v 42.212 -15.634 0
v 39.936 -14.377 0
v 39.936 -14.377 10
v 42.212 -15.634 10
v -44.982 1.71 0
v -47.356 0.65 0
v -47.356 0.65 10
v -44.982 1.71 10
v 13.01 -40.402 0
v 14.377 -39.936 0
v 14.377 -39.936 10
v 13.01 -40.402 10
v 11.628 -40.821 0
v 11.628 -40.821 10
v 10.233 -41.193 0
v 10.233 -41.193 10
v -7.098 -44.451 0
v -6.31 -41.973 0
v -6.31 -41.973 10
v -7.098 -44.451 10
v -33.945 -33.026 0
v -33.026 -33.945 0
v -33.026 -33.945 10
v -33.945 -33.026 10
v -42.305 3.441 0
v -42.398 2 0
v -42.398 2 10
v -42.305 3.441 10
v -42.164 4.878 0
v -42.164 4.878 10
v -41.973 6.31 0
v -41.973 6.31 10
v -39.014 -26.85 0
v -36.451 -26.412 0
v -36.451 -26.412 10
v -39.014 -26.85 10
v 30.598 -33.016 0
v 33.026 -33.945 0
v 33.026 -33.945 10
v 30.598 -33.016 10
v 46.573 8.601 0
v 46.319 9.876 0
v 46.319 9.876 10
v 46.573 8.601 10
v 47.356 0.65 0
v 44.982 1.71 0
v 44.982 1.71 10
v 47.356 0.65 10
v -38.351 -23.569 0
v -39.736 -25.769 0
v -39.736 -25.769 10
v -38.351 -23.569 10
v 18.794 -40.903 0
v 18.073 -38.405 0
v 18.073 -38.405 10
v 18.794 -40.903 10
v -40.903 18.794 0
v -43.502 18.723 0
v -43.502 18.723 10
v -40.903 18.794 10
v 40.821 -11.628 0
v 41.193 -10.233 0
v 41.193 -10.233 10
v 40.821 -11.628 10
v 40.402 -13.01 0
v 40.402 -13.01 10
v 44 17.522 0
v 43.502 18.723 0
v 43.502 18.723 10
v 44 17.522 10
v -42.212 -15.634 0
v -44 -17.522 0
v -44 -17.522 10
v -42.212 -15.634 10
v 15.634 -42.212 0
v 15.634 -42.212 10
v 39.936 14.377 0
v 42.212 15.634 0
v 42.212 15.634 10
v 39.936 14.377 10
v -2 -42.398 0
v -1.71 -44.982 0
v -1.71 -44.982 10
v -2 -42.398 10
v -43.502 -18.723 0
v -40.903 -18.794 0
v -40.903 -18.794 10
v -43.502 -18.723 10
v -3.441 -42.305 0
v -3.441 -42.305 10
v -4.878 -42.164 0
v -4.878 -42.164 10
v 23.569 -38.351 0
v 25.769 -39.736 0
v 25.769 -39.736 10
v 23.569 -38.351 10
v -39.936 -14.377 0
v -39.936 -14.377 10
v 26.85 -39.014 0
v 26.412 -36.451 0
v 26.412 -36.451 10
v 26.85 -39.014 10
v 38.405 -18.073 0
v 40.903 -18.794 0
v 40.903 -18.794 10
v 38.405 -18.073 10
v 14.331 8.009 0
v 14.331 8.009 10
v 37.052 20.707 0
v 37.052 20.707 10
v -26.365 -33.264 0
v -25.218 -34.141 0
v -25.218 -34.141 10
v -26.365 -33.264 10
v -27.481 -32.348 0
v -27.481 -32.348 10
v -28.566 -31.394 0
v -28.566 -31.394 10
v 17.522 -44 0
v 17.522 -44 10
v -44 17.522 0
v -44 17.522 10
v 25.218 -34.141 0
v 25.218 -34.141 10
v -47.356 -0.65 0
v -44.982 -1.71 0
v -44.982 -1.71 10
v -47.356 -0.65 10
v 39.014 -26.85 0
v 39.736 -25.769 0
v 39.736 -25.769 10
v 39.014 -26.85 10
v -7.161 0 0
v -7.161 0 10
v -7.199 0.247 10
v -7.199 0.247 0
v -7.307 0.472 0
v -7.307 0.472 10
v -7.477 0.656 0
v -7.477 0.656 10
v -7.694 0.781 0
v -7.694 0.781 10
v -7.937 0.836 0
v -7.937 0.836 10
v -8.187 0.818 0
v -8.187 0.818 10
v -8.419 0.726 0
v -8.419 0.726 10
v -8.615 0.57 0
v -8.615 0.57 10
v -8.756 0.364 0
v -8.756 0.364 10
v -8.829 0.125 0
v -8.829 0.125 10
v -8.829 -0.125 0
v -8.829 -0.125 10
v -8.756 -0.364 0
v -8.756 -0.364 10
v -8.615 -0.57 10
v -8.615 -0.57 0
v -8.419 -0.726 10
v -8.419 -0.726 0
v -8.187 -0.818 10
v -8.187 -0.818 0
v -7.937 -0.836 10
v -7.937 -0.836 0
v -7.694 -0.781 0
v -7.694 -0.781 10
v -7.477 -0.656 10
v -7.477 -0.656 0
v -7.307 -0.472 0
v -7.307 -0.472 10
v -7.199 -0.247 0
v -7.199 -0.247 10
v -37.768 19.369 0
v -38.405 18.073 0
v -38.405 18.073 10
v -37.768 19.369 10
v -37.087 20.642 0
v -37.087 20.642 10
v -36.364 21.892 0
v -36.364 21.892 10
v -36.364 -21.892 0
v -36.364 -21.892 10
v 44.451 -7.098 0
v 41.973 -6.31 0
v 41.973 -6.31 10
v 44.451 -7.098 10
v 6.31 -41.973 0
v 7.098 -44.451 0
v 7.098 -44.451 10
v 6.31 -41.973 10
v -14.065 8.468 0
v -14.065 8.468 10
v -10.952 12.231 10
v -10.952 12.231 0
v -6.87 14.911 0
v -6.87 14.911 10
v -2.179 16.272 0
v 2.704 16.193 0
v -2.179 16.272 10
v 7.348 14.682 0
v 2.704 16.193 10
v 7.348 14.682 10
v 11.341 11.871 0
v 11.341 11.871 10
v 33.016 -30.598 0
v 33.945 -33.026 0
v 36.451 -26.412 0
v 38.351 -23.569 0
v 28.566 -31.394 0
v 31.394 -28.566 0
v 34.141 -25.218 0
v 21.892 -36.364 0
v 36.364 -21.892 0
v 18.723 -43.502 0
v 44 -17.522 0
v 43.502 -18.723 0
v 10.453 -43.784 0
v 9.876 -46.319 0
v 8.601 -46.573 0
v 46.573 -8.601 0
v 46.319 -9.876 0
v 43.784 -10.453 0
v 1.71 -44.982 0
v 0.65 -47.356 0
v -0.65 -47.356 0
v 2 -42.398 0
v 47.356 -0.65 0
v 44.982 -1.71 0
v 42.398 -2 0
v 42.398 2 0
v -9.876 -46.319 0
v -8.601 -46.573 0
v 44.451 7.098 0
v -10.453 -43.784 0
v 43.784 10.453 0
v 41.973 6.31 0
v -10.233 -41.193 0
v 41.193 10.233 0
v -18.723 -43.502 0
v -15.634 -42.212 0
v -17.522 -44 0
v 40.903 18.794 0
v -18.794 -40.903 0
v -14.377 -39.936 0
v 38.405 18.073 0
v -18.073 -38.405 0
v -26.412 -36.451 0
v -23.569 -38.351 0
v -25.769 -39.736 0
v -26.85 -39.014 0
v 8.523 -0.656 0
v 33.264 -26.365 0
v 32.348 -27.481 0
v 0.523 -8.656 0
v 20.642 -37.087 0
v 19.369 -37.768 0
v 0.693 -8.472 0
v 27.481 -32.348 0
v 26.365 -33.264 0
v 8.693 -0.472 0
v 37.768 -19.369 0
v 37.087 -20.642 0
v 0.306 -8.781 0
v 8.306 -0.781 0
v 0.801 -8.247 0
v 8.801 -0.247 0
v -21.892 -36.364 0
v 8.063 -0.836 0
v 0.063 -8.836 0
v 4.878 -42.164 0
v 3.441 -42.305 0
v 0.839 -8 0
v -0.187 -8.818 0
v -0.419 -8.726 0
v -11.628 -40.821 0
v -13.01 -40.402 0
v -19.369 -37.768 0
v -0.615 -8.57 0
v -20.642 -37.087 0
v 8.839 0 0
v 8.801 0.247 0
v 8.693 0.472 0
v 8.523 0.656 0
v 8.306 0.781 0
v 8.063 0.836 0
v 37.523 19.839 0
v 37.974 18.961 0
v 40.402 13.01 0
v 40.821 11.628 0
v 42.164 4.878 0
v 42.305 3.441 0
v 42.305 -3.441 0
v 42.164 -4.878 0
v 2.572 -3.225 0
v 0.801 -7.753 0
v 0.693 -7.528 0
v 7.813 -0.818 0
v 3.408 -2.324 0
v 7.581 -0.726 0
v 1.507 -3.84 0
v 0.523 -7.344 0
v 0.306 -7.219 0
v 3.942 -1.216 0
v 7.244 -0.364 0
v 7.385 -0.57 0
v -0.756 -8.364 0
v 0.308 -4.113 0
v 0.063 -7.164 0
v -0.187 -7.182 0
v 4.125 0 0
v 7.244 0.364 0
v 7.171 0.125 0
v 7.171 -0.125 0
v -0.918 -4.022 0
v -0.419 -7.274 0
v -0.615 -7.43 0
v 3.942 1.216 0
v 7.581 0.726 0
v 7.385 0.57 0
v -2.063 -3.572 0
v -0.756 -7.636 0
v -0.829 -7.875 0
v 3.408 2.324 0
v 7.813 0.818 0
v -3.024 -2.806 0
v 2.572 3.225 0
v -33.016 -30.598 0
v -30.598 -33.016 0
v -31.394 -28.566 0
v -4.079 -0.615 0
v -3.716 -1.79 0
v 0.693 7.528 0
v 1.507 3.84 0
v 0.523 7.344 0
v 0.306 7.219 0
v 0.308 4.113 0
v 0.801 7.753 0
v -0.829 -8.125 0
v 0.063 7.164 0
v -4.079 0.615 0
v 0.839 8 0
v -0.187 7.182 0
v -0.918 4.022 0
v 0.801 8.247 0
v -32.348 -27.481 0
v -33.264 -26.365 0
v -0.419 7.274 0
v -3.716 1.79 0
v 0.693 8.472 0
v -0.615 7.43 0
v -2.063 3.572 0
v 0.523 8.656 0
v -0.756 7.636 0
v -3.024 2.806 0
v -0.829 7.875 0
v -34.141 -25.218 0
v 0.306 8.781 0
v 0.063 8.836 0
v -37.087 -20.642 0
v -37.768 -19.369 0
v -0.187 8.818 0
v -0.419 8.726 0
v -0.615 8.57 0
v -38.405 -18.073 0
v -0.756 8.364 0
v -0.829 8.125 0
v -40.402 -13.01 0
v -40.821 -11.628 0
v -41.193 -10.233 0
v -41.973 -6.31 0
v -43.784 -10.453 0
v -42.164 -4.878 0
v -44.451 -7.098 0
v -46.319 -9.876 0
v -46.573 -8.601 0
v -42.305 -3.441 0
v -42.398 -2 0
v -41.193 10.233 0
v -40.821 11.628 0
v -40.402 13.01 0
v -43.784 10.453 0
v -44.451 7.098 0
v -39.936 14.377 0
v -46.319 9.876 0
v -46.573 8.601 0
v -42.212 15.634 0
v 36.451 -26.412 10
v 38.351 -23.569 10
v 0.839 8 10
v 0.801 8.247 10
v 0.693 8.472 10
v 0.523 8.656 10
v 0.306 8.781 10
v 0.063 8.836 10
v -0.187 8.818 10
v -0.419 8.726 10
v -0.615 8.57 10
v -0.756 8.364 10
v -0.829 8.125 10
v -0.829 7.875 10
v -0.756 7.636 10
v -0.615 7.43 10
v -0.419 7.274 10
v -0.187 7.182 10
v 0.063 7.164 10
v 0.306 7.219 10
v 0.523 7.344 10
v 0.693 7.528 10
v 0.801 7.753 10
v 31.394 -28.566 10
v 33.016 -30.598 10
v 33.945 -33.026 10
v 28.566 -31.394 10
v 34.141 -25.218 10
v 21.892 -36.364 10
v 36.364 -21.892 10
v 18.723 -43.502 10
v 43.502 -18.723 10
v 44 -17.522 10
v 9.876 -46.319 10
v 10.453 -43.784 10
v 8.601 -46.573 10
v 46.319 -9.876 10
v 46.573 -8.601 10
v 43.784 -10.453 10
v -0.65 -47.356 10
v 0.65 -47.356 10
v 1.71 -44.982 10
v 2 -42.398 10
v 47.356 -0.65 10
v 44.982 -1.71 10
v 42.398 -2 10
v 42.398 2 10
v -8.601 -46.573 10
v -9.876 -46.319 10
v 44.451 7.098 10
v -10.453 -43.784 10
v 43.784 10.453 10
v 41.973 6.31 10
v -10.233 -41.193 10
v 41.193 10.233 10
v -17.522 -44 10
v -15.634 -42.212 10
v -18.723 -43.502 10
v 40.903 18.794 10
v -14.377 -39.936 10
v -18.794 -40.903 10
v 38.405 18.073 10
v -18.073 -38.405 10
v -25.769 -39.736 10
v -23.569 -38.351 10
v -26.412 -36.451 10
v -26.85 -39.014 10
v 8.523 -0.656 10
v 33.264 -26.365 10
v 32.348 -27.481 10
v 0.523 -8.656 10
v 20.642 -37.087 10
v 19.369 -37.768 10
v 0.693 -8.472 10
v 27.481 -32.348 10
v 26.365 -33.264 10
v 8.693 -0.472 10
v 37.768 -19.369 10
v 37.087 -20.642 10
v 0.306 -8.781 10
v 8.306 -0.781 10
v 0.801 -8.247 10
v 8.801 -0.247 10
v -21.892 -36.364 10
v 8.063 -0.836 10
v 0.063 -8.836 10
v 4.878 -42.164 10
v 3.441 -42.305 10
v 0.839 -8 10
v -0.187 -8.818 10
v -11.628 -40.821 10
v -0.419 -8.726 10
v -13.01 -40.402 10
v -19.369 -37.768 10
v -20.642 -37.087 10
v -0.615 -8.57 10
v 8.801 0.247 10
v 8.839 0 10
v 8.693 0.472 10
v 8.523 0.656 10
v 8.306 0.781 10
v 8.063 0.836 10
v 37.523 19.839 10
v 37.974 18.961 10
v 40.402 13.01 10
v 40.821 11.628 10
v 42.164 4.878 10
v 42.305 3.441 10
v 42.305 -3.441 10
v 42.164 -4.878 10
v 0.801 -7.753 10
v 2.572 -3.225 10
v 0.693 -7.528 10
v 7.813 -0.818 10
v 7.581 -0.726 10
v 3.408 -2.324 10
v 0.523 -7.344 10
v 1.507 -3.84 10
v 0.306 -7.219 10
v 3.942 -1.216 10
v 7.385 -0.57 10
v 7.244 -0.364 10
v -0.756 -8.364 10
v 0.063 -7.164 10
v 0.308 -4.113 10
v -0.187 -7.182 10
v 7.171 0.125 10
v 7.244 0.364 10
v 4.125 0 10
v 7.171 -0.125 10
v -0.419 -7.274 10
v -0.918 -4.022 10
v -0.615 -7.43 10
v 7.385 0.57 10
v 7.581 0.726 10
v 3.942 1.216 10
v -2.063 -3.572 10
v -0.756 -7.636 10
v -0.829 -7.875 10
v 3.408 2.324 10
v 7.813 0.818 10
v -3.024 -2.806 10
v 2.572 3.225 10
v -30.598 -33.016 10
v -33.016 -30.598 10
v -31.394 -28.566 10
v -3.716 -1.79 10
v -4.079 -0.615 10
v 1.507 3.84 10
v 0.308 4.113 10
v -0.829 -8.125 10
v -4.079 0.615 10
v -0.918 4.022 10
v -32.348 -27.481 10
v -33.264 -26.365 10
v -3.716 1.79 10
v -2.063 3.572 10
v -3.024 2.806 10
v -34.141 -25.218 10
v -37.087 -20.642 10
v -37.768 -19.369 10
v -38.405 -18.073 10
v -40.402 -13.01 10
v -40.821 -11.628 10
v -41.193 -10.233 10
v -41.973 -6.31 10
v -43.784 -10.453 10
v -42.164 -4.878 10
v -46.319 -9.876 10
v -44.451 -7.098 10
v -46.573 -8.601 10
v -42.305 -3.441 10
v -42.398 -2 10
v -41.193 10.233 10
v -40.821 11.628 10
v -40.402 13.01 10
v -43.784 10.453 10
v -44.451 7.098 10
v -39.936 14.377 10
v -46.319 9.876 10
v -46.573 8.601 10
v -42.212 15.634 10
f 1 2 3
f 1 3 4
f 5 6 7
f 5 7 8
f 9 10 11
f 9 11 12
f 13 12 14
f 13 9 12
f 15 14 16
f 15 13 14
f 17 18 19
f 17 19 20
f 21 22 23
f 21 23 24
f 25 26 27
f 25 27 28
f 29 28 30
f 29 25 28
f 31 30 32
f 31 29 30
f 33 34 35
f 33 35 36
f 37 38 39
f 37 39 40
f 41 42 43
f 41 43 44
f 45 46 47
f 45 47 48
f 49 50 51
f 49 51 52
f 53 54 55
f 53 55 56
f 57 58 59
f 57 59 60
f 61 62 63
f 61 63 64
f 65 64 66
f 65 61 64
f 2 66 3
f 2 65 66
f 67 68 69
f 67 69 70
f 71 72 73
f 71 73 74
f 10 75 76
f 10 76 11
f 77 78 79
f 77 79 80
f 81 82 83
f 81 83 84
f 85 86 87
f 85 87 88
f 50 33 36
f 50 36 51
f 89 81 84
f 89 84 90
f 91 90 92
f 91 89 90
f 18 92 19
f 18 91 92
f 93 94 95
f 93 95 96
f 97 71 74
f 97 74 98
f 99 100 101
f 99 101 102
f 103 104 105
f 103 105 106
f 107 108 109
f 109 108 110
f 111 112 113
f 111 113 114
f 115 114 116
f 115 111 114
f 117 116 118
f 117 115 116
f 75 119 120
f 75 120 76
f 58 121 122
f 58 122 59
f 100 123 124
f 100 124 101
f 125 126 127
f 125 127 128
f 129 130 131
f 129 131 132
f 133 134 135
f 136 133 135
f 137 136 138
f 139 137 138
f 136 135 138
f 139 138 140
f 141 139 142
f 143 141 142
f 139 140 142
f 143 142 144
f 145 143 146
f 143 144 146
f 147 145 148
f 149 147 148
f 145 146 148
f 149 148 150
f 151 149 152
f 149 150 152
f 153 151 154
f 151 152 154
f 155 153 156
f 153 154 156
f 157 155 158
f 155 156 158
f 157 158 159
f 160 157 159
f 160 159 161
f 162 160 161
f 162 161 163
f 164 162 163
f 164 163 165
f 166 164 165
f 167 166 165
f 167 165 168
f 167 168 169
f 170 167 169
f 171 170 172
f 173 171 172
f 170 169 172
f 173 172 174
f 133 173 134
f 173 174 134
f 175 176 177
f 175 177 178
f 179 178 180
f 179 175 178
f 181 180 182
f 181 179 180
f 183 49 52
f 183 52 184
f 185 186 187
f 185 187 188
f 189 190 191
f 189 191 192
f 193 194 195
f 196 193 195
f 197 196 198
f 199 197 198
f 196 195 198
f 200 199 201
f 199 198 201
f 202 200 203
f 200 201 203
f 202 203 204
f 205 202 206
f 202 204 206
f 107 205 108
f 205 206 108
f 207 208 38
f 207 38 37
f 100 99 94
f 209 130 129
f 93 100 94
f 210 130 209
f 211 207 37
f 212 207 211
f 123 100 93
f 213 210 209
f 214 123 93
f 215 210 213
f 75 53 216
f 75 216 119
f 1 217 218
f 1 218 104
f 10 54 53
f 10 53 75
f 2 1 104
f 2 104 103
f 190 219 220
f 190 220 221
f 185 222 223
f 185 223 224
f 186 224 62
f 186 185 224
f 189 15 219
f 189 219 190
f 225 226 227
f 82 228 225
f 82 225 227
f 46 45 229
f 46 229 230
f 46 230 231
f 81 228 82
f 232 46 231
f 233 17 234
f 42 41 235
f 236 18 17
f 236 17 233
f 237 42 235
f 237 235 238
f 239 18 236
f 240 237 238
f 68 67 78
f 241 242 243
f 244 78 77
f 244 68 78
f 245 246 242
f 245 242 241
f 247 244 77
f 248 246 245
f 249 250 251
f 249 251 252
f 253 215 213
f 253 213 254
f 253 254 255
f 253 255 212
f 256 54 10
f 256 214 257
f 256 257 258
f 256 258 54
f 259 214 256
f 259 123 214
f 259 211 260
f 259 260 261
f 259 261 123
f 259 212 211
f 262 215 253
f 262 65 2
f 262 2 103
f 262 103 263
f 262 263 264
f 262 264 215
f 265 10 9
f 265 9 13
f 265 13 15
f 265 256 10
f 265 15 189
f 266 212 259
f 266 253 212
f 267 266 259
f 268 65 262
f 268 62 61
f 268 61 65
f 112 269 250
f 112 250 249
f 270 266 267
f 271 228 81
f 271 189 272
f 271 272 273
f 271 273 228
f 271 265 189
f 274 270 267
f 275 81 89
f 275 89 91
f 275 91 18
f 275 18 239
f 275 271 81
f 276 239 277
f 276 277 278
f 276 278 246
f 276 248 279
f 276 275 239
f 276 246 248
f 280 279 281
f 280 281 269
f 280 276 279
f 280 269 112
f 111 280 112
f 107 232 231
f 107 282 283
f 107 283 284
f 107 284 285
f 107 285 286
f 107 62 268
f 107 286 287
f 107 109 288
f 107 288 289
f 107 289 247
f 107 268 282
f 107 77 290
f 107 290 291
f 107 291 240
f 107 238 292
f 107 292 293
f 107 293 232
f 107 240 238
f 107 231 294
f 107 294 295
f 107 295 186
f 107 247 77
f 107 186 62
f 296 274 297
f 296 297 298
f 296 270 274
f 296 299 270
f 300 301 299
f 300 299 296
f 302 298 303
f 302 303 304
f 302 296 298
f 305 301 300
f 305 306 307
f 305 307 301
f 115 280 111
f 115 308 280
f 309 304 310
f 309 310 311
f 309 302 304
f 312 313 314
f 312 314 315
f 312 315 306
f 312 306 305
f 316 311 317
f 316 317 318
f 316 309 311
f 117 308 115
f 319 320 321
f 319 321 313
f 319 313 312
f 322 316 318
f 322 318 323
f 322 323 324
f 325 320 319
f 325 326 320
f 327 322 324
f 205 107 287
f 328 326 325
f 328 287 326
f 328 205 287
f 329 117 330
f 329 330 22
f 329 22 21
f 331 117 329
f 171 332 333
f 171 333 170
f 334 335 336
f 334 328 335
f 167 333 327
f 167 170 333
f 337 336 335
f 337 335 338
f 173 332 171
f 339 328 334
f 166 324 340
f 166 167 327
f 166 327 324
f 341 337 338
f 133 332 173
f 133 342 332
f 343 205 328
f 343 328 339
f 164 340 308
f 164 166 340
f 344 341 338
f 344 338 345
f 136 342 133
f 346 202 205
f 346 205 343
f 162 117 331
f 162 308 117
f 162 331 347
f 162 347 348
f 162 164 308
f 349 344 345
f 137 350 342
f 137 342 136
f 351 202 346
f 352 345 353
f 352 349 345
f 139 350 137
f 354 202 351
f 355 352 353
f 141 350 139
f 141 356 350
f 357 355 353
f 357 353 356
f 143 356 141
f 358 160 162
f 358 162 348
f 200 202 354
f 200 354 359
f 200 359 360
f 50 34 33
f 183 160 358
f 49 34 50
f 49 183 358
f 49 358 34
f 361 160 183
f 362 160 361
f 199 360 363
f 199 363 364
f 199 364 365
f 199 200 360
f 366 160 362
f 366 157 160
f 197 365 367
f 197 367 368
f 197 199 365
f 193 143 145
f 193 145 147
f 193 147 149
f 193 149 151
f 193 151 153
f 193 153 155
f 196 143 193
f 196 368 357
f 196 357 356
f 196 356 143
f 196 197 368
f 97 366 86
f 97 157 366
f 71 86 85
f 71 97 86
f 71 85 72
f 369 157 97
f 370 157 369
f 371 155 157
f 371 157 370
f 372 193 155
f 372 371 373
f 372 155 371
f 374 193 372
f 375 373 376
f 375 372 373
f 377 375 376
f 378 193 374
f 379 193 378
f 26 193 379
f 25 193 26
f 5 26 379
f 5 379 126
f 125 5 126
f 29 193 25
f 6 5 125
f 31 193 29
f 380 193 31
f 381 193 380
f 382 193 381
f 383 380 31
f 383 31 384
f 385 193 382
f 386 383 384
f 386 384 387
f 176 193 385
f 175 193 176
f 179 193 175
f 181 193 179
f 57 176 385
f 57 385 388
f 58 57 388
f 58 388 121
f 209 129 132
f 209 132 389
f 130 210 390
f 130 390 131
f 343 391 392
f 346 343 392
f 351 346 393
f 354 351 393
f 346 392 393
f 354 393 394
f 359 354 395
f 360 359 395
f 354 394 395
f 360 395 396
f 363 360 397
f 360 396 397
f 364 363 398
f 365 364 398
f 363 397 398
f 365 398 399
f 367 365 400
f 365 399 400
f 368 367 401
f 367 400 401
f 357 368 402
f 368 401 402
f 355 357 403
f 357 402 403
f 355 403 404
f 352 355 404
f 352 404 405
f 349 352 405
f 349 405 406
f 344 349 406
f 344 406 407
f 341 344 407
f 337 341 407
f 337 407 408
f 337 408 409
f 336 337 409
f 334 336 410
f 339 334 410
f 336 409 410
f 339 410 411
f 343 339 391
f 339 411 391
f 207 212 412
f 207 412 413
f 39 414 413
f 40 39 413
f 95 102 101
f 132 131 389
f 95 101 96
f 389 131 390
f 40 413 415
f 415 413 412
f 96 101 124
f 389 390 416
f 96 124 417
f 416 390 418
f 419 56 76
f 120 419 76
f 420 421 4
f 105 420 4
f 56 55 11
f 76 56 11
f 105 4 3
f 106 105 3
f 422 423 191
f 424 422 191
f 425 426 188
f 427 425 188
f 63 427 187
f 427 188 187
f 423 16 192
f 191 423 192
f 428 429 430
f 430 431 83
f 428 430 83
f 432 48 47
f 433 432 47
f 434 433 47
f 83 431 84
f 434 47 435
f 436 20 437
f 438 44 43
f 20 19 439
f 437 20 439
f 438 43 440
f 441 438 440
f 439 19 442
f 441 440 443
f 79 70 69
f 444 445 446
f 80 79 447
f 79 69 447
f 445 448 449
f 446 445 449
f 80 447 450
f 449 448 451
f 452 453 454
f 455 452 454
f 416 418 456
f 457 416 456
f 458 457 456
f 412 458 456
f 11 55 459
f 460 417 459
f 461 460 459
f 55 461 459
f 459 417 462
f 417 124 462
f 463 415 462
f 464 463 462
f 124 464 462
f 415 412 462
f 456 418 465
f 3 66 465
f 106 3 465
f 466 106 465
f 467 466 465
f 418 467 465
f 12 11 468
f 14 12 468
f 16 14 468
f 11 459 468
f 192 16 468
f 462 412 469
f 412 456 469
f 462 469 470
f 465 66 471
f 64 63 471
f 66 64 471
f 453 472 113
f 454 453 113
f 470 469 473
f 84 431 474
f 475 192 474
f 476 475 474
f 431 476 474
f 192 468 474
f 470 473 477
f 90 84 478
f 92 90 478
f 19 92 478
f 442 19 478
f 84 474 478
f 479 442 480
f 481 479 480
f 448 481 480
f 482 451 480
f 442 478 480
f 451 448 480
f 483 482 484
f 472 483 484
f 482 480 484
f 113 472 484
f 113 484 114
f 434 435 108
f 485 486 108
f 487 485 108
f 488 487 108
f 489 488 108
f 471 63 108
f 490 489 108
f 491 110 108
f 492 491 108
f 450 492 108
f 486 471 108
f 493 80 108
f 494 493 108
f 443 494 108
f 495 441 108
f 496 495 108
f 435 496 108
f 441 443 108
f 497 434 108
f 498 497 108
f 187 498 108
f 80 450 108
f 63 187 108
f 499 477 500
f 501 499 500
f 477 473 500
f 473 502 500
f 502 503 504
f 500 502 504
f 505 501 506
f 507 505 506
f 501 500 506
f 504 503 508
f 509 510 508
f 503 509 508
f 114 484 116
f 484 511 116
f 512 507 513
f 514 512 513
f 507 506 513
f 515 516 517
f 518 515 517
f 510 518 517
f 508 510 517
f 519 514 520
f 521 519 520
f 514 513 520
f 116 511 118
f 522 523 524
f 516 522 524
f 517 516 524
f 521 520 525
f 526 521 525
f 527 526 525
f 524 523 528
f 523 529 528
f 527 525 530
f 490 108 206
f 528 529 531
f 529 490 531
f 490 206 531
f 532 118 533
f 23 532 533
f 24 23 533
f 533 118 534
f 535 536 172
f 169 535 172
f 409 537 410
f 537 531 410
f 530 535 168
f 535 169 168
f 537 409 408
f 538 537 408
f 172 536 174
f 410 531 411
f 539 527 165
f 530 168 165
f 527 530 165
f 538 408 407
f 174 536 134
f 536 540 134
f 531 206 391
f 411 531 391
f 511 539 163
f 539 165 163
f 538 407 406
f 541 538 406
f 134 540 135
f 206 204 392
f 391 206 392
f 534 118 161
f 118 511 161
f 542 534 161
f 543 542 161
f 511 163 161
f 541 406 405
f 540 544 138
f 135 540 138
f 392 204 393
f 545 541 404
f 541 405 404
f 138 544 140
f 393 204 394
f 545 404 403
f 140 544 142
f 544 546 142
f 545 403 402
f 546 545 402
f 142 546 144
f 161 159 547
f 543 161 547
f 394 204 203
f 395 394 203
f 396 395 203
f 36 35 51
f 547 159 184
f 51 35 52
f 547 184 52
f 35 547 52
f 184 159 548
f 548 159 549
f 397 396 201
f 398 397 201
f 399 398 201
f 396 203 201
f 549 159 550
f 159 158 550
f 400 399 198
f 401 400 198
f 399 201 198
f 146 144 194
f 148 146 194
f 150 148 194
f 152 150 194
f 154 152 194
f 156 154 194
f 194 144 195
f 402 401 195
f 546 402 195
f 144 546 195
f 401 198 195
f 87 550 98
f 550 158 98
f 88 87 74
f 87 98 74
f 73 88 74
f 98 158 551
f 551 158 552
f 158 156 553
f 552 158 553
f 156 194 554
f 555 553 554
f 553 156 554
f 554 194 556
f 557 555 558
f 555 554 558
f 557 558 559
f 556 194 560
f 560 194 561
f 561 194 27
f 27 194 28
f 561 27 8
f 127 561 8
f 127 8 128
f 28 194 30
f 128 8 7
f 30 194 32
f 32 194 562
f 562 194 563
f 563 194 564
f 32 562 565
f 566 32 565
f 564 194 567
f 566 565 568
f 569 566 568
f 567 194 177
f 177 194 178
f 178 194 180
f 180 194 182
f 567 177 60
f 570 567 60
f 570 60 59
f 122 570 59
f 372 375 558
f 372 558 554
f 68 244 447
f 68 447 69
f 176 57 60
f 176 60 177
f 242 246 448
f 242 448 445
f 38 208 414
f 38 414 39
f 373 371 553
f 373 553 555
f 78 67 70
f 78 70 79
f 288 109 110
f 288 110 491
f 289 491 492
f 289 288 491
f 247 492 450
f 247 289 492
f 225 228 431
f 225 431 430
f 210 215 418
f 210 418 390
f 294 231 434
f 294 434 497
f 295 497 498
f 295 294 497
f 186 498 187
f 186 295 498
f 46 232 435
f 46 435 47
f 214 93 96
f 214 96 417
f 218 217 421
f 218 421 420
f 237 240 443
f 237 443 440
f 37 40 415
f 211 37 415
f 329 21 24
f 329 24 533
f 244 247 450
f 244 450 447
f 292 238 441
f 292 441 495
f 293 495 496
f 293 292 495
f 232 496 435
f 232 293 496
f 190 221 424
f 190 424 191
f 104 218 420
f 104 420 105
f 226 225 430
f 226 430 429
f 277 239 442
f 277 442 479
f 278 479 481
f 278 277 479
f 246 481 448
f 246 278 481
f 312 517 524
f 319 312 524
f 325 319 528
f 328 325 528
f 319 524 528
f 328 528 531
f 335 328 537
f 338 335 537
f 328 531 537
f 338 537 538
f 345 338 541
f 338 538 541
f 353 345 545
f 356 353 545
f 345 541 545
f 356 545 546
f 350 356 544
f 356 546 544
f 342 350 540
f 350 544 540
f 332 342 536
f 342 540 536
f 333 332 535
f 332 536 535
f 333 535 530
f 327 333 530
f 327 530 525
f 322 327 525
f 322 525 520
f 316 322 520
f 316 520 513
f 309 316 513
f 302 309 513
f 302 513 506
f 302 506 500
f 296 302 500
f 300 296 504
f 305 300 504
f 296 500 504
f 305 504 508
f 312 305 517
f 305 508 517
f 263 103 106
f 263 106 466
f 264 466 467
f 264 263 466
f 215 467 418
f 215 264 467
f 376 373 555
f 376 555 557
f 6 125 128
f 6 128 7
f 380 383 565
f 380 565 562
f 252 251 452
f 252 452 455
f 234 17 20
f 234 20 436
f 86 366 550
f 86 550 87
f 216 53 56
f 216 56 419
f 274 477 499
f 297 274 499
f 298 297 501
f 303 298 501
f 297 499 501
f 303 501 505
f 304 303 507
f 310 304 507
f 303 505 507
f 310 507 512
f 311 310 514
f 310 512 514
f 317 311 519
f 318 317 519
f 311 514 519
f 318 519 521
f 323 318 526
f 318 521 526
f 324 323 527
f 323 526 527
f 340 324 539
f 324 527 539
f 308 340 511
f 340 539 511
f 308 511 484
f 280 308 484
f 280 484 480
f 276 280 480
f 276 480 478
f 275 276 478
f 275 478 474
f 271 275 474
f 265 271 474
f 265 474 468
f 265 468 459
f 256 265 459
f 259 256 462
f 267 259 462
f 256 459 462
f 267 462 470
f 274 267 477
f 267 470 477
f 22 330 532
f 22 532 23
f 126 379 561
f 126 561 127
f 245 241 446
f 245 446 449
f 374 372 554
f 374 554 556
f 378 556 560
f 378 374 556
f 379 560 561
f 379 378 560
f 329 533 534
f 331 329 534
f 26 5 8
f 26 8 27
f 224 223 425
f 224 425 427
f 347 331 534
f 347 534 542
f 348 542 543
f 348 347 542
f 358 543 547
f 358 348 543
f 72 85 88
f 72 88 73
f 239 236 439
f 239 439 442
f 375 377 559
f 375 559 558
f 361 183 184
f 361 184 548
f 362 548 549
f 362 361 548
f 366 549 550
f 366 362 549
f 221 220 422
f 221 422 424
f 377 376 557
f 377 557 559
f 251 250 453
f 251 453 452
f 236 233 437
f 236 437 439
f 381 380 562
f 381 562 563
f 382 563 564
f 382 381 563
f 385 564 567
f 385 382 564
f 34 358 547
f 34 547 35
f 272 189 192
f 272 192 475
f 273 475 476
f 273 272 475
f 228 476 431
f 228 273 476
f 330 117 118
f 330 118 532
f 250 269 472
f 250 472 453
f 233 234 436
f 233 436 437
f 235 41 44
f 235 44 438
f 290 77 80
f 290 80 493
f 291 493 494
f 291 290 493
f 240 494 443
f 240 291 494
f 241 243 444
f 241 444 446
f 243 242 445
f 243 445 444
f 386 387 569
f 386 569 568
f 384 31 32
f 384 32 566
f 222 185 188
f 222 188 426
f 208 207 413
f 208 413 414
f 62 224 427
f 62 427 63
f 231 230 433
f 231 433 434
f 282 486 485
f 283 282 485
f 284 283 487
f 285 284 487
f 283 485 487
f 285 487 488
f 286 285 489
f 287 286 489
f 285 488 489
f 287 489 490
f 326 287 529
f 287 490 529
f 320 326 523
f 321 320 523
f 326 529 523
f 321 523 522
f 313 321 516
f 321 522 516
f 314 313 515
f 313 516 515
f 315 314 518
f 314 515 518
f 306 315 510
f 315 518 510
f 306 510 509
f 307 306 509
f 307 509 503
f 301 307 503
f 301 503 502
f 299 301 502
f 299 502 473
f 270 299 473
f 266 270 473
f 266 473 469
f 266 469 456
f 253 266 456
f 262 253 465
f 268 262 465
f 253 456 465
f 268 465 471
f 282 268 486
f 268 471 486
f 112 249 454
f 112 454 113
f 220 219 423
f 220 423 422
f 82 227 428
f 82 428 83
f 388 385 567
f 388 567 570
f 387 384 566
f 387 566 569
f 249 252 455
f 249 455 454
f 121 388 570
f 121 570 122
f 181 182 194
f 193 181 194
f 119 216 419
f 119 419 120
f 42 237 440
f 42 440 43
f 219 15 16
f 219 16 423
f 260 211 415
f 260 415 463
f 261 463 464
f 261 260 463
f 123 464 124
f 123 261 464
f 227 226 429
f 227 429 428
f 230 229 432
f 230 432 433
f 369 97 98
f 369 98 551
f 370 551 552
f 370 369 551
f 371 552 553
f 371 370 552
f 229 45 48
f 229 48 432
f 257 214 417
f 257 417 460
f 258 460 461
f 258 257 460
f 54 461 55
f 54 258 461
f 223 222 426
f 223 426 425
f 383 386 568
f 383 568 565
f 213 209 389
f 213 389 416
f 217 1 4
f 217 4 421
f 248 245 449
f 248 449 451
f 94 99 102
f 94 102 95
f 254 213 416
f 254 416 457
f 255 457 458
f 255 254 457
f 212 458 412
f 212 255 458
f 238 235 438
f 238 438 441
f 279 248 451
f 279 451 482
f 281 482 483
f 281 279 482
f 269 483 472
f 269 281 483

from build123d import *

# Parameters (mm, degrees)
BOSS_EXTRU_1_DEPTH      = 10
ESQUISSE2_R             = 0.838714544
ESQUISSE2_R_2           = 4.125
ENL_V_MAT_EXTRU_3_DEPTH = 10
ENL_V_MAT_EXTRU_6_DEPTH = 10


with BuildPart() as part:
    # Esquisse1 → Boss.-Extru.1 (new body)
    with BuildSketch(Plane.XY):
        with BuildLine():
            Line((-2, 42.397854014), (-1.710180776, 44.981650604))
            Line((-1.710180776, 44.981650604), (-0.65, 47.355680242))
            Line((-0.65, 47.355680242), (0.65, 47.355680242))
            Line((0.65, 47.355680242), (1.710180776, 44.981650604))
            Line((1.710180776, 44.981650604), (2, 42.397854014))
            ThreePointArc((2, 42.397854014), (4.160337521, 42.240615724), (6.309840432, 41.973371782))
            Line((6.309840432, 41.973371782), (7.098164569, 44.450980519))
            Line((7.098164569, 44.450980519), (8.601124475, 46.572562834))
            Line((8.601124475, 46.572562834), (9.87614534, 46.318945415))
            Line((9.87614534, 46.318945415), (10.452804833, 43.783701082))
            Line((10.452804833, 43.783701082), (10.232981553, 41.193010494))
            ThreePointArc((10.232981553, 41.193010494), (12.321133126, 40.61733255), (14.377197234, 39.935876411))
            Line((14.377197234, 39.935876411), (15.63373143, 42.212084181))
            Line((15.63373143, 42.212084181), (17.521712561, 43.999687955))
            Line((17.521712561, 43.999687955), (18.722755953, 43.502199493))
            Line((18.722755953, 43.502199493), (18.793733463, 40.903168482))
            Line((18.793733463, 40.903168482), (18.072715364, 38.405142681))
            ThreePointArc((18.072715364, 38.405142681), (20.008434495, 37.433148065), (21.89204641, 36.363667706))
            Line((21.89204641, 36.363667706), (23.568502761, 38.351001121))
            Line((23.568502761, 38.351001121), (25.768951059, 39.735929742))
            Line((25.768951059, 39.735929742), (26.849861555, 39.01368844))
            Line((26.849861555, 39.01368844), (26.412429455, 36.450750056))
            Line((26.412429455, 36.450750056), (25.217924859, 34.141386774))
            ThreePointArc((25.217924859, 34.141386774), (26.926822946, 32.810428693), (28.565596519, 31.394023643))
            Line((28.565596519, 31.394023643), (30.597549747, 33.016110595))
            Line((30.597549747, 33.016110595), (33.025903219, 33.945142034))
            Line((33.025903219, 33.945142034), (33.945142034, 33.025903219))
            Line((33.945142034, 33.025903219), (33.016110595, 30.597549747))
            Line((33.016110595, 30.597549747), (31.394023643, 28.565596519))
            ThreePointArc((31.394023643, 28.565596519), (32.810428693, 26.926822946), (34.141386774, 25.217924859))
            Line((34.141386774, 25.217924859), (36.450750056, 26.412429455))
            Line((36.450750056, 26.412429455), (39.01368844, 26.849861555))
            Line((39.01368844, 26.849861555), (39.735929742, 25.768951059))
            Line((39.735929742, 25.768951059), (38.351001121, 23.568502761))
            Line((38.351001121, 23.568502761), (36.363667706, 21.89204641))
            ThreePointArc((36.363667706, 21.89204641), (37.433148065, 20.008434495), (38.405142681, 18.072715364))
            Line((38.405142681, 18.072715364), (40.903168482, 18.793733463))
            Line((40.903168482, 18.793733463), (43.502199493, 18.722755953))
            Line((43.502199493, 18.722755953), (43.999687955, 17.521712561))
            Line((43.999687955, 17.521712561), (42.212084181, 15.63373143))
            Line((42.212084181, 15.63373143), (39.935876411, 14.377197234))
            ThreePointArc((39.935876411, 14.377197234), (40.61733255, 12.321133126), (41.193010494, 10.232981553))
            Line((41.193010494, 10.232981553), (43.783701082, 10.452804833))
            Line((43.783701082, 10.452804833), (46.318945415, 9.87614534))
            Line((46.318945415, 9.87614534), (46.572562834, 8.601124475))
            Line((46.572562834, 8.601124475), (44.450980519, 7.098164569))
            Line((44.450980519, 7.098164569), (41.973371782, 6.309840432))
            ThreePointArc((41.973371782, 6.309840432), (42.240615724, 4.160337521), (42.397854014, 2))
            Line((42.397854014, 2), (44.981650604, 1.710180776))
            Line((44.981650604, 1.710180776), (47.355680242, 0.65))
            Line((47.355680242, 0.65), (47.355680242, -0.65))
            Line((47.355680242, -0.65), (44.981650604, -1.710180776))
            Line((44.981650604, -1.710180776), (42.397854014, -2))
            ThreePointArc((42.397854014, -2), (42.240615724, -4.160337521), (41.973371782, -6.309840432))
            Line((41.973371782, -6.309840432), (44.450980519, -7.098164569))
            Line((44.450980519, -7.098164569), (46.572562834, -8.601124475))
            Line((46.572562834, -8.601124475), (46.318945415, -9.87614534))
            Line((46.318945415, -9.87614534), (43.783701082, -10.452804833))
            Line((43.783701082, -10.452804833), (41.193010494, -10.232981553))
            ThreePointArc((41.193010494, -10.232981553), (40.61733255, -12.321133126), (39.935876411, -14.377197234))
            Line((39.935876411, -14.377197234), (42.212084181, -15.63373143))
            Line((42.212084181, -15.63373143), (43.999687955, -17.521712561))
            Line((43.999687955, -17.521712561), (43.502199493, -18.722755953))
            Line((43.502199493, -18.722755953), (40.903168482, -18.793733463))
            Line((40.903168482, -18.793733463), (38.405142681, -18.072715364))
            ThreePointArc((38.405142681, -18.072715364), (37.433148065, -20.008434495), (36.363667706, -21.89204641))
            Line((36.363667706, -21.89204641), (38.351001121, -23.568502761))
            Line((38.351001121, -23.568502761), (39.735929742, -25.768951059))
            Line((39.735929742, -25.768951059), (39.01368844, -26.849861555))
            Line((39.01368844, -26.849861555), (36.450750056, -26.412429455))
            Line((36.450750056, -26.412429455), (34.141386774, -25.217924859))
            ThreePointArc((34.141386774, -25.217924859), (32.810428693, -26.926822946), (31.394023643, -28.565596519))
            Line((31.394023643, -28.565596519), (33.016110595, -30.597549747))
            Line((33.016110595, -30.597549747), (33.945142034, -33.025903219))
            Line((33.945142034, -33.025903219), (33.025903219, -33.945142034))
            Line((33.025903219, -33.945142034), (30.597549747, -33.016110595))
            Line((30.597549747, -33.016110595), (28.565596519, -31.394023643))
            ThreePointArc((28.565596519, -31.394023643), (26.926822946, -32.810428693), (25.217924859, -34.141386774))
            Line((25.217924859, -34.141386774), (26.412429455, -36.450750056))
            Line((26.412429455, -36.450750056), (26.849861555, -39.01368844))
            Line((26.849861555, -39.01368844), (25.768951059, -39.735929742))
            Line((25.768951059, -39.735929742), (23.568502761, -38.351001121))
            Line((23.568502761, -38.351001121), (21.89204641, -36.363667706))
            ThreePointArc((21.89204641, -36.363667706), (20.008434495, -37.433148065), (18.072715364, -38.405142681))
            Line((18.072715364, -38.405142681), (18.793733463, -40.903168482))
            Line((18.793733463, -40.903168482), (18.722755953, -43.502199493))
            Line((18.722755953, -43.502199493), (17.521712561, -43.999687955))
            Line((17.521712561, -43.999687955), (15.63373143, -42.212084181))
            Line((15.63373143, -42.212084181), (14.377197234, -39.935876411))
            ThreePointArc((14.377197234, -39.935876411), (12.321133126, -40.61733255), (10.232981553, -41.193010494))
            Line((10.232981553, -41.193010494), (10.452804833, -43.783701082))
            Line((10.452804833, -43.783701082), (9.87614534, -46.318945415))
            Line((9.87614534, -46.318945415), (8.601124475, -46.572562834))
            Line((8.601124475, -46.572562834), (7.098164569, -44.450980519))
            Line((7.098164569, -44.450980519), (6.309840432, -41.973371782))
            ThreePointArc((6.309840432, -41.973371782), (4.160337521, -42.240615724), (2, -42.397854014))
            Line((2, -42.397854014), (1.710180776, -44.981650604))
            Line((1.710180776, -44.981650604), (0.65, -47.355680242))
            Line((0.65, -47.355680242), (-0.65, -47.355680242))
            Line((-0.65, -47.355680242), (-1.710180776, -44.981650604))
            Line((-1.710180776, -44.981650604), (-2, -42.397854014))
            ThreePointArc((-2, -42.397854014), (-4.160337521, -42.240615724), (-6.309840432, -41.973371782))
            Line((-6.309840432, -41.973371782), (-7.098164569, -44.450980519))
            Line((-7.098164569, -44.450980519), (-8.601124475, -46.572562834))
            Line((-8.601124475, -46.572562834), (-9.87614534, -46.318945415))
            Line((-9.87614534, -46.318945415), (-10.452804833, -43.783701082))
            Line((-10.452804833, -43.783701082), (-10.232981553, -41.193010494))
            ThreePointArc((-10.232981553, -41.193010494), (-12.321133126, -40.61733255), (-14.377197234, -39.935876411))
            Line((-14.377197234, -39.935876411), (-15.63373143, -42.212084181))
            Line((-15.63373143, -42.212084181), (-17.521712561, -43.999687955))
            Line((-17.521712561, -43.999687955), (-18.722755953, -43.502199493))
            Line((-18.722755953, -43.502199493), (-18.793733463, -40.903168482))
            Line((-18.793733463, -40.903168482), (-18.072715364, -38.405142681))
            ThreePointArc((-18.072715364, -38.405142681), (-20.008434495, -37.433148065), (-21.89204641, -36.363667706))
            Line((-21.89204641, -36.363667706), (-23.568502761, -38.351001121))
            Line((-23.568502761, -38.351001121), (-25.768951059, -39.735929742))
            Line((-25.768951059, -39.735929742), (-26.849861555, -39.01368844))
            Line((-26.849861555, -39.01368844), (-26.412429455, -36.450750056))
            Line((-26.412429455, -36.450750056), (-25.217924859, -34.141386774))
            ThreePointArc((-25.217924859, -34.141386774), (-26.926822946, -32.810428693), (-28.565596519, -31.394023643))
            Line((-28.565596519, -31.394023643), (-30.597549747, -33.016110595))
            Line((-30.597549747, -33.016110595), (-33.025903219, -33.945142034))
            Line((-33.025903219, -33.945142034), (-33.945142034, -33.025903219))
            Line((-33.945142034, -33.025903219), (-33.016110595, -30.597549747))
            Line((-33.016110595, -30.597549747), (-31.394023643, -28.565596519))
            ThreePointArc((-31.394023643, -28.565596519), (-32.810428693, -26.926822946), (-34.141386774, -25.217924859))
            Line((-34.141386774, -25.217924859), (-36.450750056, -26.412429455))
            Line((-36.450750056, -26.412429455), (-39.01368844, -26.849861555))
            Line((-39.01368844, -26.849861555), (-39.735929742, -25.768951059))
            Line((-39.735929742, -25.768951059), (-38.351001121, -23.568502761))
            Line((-38.351001121, -23.568502761), (-36.363667706, -21.89204641))
            ThreePointArc((-36.363667706, -21.89204641), (-37.433148065, -20.008434495), (-38.405142681, -18.072715364))
            Line((-38.405142681, -18.072715364), (-40.903168482, -18.793733463))
            Line((-40.903168482, -18.793733463), (-43.502199493, -18.722755953))
            Line((-43.502199493, -18.722755953), (-43.999687955, -17.521712561))
            Line((-43.999687955, -17.521712561), (-42.212084181, -15.63373143))
            Line((-42.212084181, -15.63373143), (-39.935876411, -14.377197234))
            ThreePointArc((-39.935876411, -14.377197234), (-40.61733255, -12.321133126), (-41.193010494, -10.232981553))
            Line((-41.193010494, -10.232981553), (-43.783701082, -10.452804833))
            Line((-43.783701082, -10.452804833), (-46.318945415, -9.87614534))
            Line((-46.318945415, -9.87614534), (-46.572562834, -8.601124475))
            Line((-46.572562834, -8.601124475), (-44.450980519, -7.098164569))
            Line((-44.450980519, -7.098164569), (-41.973371782, -6.309840432))
            ThreePointArc((-41.973371782, -6.309840432), (-42.240615724, -4.160337521), (-42.397854014, -2))
            Line((-42.397854014, -2), (-44.981650604, -1.710180776))
            Line((-44.981650604, -1.710180776), (-47.355680242, -0.65))
            Line((-47.355680242, -0.65), (-47.355680242, 0.65))
            Line((-47.355680242, 0.65), (-44.981650604, 1.710180776))
            Line((-44.981650604, 1.710180776), (-42.397854014, 2))
            ThreePointArc((-42.397854014, 2), (-42.240615724, 4.160337521), (-41.973371782, 6.309840432))
            Line((-41.973371782, 6.309840432), (-44.450980519, 7.098164569))
            Line((-44.450980519, 7.098164569), (-46.572562834, 8.601124475))
            Line((-46.572562834, 8.601124475), (-46.318945415, 9.87614534))
            Line((-46.318945415, 9.87614534), (-43.783701082, 10.452804833))
            Line((-43.783701082, 10.452804833), (-41.193010494, 10.232981553))
            ThreePointArc((-41.193010494, 10.232981553), (-40.61733255, 12.321133126), (-39.935876411, 14.377197234))
            Line((-39.935876411, 14.377197234), (-42.212084181, 15.63373143))
            Line((-42.212084181, 15.63373143), (-43.999687955, 17.521712561))
            Line((-43.999687955, 17.521712561), (-43.502199493, 18.722755953))
            Line((-43.502199493, 18.722755953), (-40.903168482, 18.793733463))
            Line((-40.903168482, 18.793733463), (-38.405142681, 18.072715364))
            ThreePointArc((-38.405142681, 18.072715364), (-37.433148065, 20.008434495), (-36.363667706, 21.89204641))
            Line((-36.363667706, 21.89204641), (-38.351001121, 23.568502761))
            Line((-38.351001121, 23.568502761), (-39.735929742, 25.768951059))
            Line((-39.735929742, 25.768951059), (-39.01368844, 26.849861555))
            Line((-39.01368844, 26.849861555), (-36.450750056, 26.412429455))
            Line((-36.450750056, 26.412429455), (-34.141386774, 25.217924859))
            ThreePointArc((-34.141386774, 25.217924859), (-32.810428693, 26.926822946), (-31.394023643, 28.565596519))
            Line((-31.394023643, 28.565596519), (-33.016110595, 30.597549747))
            Line((-33.016110595, 30.597549747), (-33.945142034, 33.025903219))
            Line((-33.945142034, 33.025903219), (-33.025903219, 33.945142034))
            Line((-33.025903219, 33.945142034), (-30.597549747, 33.016110595))
            Line((-30.597549747, 33.016110595), (-28.565596519, 31.394023643))
            ThreePointArc((-28.565596519, 31.394023643), (-26.926822946, 32.810428693), (-25.217924859, 34.141386774))
            Line((-25.217924859, 34.141386774), (-26.412429455, 36.450750056))
            Line((-26.412429455, 36.450750056), (-26.849861555, 39.01368844))
            Line((-26.849861555, 39.01368844), (-25.768951059, 39.735929742))
            Line((-25.768951059, 39.735929742), (-23.568502761, 38.351001121))
            Line((-23.568502761, 38.351001121), (-21.89204641, 36.363667706))
            ThreePointArc((-21.89204641, 36.363667706), (-20.008434495, 37.433148065), (-18.072715364, 38.405142681))
            Line((-18.072715364, 38.405142681), (-18.793733463, 40.903168482))
            Line((-18.793733463, 40.903168482), (-18.722755953, 43.502199493))
            Line((-18.722755953, 43.502199493), (-17.521712561, 43.999687955))
            Line((-17.521712561, 43.999687955), (-15.63373143, 42.212084181))
            Line((-15.63373143, 42.212084181), (-14.377197234, 39.935876411))
            ThreePointArc((-14.377197234, 39.935876411), (-12.321133126, 40.61733255), (-10.232981553, 41.193010494))
            Line((-10.232981553, 41.193010494), (-10.452804833, 43.783701082))
            Line((-10.452804833, 43.783701082), (-9.87614534, 46.318945415))
            Line((-9.87614534, 46.318945415), (-8.601124475, 46.572562834))
            Line((-8.601124475, 46.572562834), (-7.098164569, 44.450980519))
            Line((-7.098164569, 44.450980519), (-6.309840432, 41.973371782))
            ThreePointArc((-6.309840432, 41.973371782), (-4.160337521, 42.240615724), (-2, 42.397854014))
        make_face()
    extrude(amount=BOSS_EXTRU_1_DEPTH)

    # Esquisse2 → Enlèv. mat.-Extru.3 (cut)
    with BuildSketch(Plane.XY.offset(10)):
        with Locations((0, 8)):
            Circle(ESQUISSE2_R)
        Circle(ESQUISSE2_R_2)
        with Locations((8, 0)):
            Circle(ESQUISSE2_R)
        with Locations((0, -8)):
            Circle(ESQUISSE2_R)
        with Locations((-8, 0)):
            Circle(ESQUISSE2_R)
    extrude(amount=-ENL_V_MAT_EXTRU_3_DEPTH, mode=Mode.SUBTRACT)

    # Esquisse3 → Enlèv. mat.-Extru.6 (cut)
    with BuildSketch(Plane.XY.offset(10)):
        with BuildLine():
            Line((-36.363667706, 21.89204641), (-14.065404068, 8.467805864))
            ThreePointArc((-14.065404068, 8.467805864), (0.265065614, 16.415513028), (14.331463821, 8.009274155))
            Line((14.331463821, 8.009274155), (37.051519146, 20.706592042))
            Line((37.051519146, 20.706592042), (45.6183096, 25.494223943))
            ThreePointArc((45.6183096, 25.494223943), (0.922129514, 57.107479129), (-44.77141801, 26.953770693))
            Line((-44.77141801, 26.953770693), (-36.363667706, 21.89204641))
        make_face()
    extrude(amount=-ENL_V_MAT_EXTRU_6_DEPTH, mode=Mode.SUBTRACT)


solid = part.part
